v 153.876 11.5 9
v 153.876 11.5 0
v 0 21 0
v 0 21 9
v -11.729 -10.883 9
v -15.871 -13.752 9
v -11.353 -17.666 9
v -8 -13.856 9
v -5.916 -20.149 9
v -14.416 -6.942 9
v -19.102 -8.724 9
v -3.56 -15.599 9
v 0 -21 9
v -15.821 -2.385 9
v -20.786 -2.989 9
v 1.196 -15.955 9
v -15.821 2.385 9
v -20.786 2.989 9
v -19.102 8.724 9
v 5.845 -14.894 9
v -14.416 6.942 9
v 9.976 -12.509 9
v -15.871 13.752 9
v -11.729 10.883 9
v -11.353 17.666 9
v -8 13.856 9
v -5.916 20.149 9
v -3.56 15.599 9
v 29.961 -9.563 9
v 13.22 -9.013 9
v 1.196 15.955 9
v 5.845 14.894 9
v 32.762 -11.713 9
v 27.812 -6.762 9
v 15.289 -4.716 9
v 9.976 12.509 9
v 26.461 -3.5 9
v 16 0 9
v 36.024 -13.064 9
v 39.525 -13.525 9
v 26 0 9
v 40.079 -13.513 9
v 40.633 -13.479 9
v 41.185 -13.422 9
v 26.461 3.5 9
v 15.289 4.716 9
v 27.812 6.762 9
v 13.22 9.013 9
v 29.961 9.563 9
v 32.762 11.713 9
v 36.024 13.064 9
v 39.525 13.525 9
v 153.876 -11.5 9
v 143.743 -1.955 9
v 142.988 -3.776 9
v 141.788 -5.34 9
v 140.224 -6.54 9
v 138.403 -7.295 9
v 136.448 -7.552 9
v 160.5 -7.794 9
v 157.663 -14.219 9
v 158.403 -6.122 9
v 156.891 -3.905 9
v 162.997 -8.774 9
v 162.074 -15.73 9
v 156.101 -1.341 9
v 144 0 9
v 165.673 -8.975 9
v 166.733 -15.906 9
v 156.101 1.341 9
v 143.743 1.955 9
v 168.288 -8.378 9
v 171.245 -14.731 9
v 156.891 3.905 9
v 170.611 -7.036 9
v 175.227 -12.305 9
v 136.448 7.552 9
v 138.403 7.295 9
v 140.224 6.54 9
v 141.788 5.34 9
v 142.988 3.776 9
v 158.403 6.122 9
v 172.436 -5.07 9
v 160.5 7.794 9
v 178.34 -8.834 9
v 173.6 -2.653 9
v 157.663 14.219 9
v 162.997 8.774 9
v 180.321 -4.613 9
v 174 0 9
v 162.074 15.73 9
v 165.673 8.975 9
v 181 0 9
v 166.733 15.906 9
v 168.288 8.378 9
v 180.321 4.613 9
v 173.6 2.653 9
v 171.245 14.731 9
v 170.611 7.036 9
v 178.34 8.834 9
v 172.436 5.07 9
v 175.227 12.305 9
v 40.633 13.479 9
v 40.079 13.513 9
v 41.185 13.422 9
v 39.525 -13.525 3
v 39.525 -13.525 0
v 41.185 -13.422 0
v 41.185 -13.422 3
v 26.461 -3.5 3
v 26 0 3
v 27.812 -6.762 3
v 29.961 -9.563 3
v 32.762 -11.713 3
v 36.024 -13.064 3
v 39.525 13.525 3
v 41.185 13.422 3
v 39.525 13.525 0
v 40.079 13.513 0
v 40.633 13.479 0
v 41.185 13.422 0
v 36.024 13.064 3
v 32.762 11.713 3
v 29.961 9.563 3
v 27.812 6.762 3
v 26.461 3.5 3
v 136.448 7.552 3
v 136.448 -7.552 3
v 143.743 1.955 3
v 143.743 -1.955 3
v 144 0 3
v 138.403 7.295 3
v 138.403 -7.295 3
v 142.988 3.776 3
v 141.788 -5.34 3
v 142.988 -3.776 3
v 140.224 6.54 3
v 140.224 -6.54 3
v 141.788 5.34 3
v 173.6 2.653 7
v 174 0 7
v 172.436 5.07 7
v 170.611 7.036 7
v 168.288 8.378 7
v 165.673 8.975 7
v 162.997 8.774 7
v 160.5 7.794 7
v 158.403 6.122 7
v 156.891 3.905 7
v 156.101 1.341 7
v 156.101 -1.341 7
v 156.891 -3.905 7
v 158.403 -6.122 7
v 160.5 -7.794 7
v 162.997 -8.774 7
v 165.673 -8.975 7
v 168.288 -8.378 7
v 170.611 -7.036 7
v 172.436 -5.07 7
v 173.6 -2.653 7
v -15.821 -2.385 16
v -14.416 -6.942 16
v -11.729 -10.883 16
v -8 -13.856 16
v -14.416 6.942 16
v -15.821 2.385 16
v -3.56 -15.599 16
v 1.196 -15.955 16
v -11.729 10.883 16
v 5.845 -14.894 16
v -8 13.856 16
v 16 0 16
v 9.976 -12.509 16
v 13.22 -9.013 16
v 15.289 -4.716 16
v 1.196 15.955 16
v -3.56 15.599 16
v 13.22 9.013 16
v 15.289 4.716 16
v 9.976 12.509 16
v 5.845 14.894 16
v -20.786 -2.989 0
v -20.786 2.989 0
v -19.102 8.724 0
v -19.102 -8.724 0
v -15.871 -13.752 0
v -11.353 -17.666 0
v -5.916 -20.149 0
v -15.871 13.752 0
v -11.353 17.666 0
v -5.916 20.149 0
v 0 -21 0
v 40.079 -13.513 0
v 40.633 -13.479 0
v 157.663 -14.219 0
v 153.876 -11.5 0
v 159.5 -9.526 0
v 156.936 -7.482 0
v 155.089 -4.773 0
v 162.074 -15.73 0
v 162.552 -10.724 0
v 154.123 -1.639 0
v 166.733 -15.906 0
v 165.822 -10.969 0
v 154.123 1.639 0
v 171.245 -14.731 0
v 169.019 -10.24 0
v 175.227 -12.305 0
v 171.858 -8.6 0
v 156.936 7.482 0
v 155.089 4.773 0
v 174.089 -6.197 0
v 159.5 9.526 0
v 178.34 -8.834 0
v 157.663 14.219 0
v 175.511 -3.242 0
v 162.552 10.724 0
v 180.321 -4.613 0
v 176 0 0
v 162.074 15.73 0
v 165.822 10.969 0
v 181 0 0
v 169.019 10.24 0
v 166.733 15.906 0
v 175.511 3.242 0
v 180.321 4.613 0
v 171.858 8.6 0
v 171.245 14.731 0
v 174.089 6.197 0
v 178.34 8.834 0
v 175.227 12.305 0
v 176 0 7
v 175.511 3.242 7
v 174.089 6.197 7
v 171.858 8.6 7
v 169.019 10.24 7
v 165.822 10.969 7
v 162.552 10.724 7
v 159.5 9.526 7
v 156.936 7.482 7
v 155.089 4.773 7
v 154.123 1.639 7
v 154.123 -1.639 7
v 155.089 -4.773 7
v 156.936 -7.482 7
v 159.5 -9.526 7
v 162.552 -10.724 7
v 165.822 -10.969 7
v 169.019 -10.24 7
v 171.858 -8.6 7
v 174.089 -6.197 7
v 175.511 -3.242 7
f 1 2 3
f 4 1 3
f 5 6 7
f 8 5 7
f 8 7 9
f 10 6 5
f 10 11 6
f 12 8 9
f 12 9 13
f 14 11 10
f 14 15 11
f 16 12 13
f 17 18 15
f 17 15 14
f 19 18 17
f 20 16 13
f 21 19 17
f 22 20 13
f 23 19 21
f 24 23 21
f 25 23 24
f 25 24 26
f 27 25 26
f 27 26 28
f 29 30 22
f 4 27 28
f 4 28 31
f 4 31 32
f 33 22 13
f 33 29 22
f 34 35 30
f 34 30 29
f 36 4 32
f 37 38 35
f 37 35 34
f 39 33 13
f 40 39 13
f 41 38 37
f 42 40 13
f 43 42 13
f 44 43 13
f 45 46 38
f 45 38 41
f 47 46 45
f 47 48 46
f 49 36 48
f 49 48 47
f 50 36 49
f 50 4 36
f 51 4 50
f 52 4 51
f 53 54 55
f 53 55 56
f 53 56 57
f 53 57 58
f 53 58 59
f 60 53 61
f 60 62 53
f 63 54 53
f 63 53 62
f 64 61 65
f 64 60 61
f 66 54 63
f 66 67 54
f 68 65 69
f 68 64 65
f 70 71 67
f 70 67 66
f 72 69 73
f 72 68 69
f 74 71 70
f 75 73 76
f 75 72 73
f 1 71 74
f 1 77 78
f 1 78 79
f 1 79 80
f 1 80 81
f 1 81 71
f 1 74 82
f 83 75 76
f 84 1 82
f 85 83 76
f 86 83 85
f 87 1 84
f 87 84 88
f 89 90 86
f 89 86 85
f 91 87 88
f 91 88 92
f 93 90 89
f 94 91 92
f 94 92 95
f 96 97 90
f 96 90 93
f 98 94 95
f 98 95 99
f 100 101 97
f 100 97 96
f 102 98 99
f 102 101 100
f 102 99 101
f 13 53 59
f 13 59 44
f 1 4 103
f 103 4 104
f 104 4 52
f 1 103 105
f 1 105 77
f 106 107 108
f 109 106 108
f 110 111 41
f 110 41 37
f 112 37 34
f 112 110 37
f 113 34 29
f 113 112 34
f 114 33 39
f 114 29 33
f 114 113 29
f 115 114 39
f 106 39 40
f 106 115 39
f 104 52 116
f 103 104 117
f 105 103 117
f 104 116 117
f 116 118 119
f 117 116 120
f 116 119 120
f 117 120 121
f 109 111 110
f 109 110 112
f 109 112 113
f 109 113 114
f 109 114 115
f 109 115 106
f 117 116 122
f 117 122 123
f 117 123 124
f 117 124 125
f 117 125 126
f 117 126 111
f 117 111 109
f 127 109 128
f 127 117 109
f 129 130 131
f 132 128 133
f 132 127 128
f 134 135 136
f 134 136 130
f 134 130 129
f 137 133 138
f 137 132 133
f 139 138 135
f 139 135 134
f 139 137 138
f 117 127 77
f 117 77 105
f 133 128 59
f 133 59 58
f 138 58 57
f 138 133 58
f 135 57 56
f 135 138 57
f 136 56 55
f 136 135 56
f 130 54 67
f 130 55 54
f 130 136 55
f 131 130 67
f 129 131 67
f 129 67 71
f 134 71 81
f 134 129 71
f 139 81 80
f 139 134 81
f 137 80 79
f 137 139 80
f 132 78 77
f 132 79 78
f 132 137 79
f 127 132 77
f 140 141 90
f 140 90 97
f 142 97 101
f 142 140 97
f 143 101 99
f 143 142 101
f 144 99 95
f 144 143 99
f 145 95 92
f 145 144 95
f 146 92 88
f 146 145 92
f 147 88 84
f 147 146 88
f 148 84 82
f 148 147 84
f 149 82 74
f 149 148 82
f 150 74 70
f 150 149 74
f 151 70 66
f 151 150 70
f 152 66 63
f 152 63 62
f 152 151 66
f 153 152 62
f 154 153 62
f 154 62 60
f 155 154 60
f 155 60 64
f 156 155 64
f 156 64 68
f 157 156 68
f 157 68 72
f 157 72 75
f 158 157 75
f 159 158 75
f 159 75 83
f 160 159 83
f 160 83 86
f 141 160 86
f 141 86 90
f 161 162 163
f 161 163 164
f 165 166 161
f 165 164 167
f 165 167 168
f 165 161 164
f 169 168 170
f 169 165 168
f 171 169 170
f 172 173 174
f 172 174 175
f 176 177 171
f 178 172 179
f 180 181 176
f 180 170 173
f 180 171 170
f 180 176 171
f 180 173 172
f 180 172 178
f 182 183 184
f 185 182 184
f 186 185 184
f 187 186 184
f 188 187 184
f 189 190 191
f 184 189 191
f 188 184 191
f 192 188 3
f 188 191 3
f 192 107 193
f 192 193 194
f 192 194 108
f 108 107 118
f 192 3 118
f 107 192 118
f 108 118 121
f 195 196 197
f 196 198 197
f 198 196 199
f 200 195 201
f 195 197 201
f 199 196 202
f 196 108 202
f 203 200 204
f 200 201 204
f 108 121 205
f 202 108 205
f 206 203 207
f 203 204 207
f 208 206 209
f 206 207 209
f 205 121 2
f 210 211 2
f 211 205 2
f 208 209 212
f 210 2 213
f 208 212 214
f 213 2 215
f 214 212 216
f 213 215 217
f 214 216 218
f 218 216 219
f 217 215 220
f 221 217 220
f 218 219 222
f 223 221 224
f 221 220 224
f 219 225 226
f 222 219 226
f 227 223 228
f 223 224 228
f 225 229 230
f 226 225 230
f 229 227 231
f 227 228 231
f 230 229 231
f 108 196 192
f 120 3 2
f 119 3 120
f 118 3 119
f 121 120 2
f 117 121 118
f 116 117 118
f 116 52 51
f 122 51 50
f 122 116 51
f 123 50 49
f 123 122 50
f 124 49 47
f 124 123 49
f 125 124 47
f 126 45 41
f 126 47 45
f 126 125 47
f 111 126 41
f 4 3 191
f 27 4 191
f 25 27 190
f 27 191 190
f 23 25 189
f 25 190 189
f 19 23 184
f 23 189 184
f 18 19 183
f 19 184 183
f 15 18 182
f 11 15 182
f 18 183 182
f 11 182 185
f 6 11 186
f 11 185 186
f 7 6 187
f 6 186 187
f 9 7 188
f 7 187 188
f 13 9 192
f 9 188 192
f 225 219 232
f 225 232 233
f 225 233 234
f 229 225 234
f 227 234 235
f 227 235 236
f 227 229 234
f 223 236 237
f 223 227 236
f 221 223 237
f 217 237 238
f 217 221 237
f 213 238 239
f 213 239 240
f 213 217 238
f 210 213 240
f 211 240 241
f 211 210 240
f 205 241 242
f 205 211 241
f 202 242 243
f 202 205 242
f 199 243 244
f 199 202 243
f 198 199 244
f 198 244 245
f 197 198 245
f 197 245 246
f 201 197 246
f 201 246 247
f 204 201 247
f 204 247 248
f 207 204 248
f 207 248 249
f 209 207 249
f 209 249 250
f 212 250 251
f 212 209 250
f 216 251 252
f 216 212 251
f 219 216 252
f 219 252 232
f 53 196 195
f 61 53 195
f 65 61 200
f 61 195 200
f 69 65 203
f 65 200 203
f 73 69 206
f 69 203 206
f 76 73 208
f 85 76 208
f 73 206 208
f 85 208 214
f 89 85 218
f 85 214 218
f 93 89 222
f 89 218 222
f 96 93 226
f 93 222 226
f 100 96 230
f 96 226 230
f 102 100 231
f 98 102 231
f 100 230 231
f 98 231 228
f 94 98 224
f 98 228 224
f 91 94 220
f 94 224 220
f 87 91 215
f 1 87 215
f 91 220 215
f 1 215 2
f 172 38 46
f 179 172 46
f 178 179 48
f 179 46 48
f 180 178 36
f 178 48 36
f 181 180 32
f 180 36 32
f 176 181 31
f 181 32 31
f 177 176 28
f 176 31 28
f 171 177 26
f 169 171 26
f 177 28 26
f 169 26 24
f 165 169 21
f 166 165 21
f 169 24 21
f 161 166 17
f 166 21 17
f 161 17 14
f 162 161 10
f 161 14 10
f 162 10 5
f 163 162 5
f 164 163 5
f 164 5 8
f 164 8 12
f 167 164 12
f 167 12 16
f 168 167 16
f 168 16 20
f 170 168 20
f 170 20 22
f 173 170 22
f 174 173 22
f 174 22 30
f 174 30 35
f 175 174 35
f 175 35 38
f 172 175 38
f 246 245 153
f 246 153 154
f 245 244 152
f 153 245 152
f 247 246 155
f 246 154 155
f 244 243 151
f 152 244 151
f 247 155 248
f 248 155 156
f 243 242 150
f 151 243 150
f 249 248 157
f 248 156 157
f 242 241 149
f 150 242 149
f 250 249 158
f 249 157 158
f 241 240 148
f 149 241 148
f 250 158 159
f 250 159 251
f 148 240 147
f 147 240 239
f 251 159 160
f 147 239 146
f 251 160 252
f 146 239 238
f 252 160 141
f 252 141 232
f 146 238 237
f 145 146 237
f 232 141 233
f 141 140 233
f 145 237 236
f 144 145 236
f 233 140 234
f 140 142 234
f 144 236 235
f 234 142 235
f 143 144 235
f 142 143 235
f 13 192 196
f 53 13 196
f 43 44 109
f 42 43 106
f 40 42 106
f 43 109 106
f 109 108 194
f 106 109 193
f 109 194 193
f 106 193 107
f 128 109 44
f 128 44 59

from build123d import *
from build123d.topology import SkipClean

# Parameters (mm, degrees)
SKETCH6_R           = 9
BOSS_EXTRUDE2_DEPTH = 9
SKETCH6_10_R        = 16
BOSS_EXTRUDE3_DEPTH = 16
CUT_EXTRUDE2_REACH  = 187.915
CUT_EXTRUDE2_START  = 3
SKETCH6_20_R        = 11
CUT_EXTRUDE5_DEPTH  = 7


with BuildPart() as part:
    # Sketch6 → Boss-Extrude2 (new body)
    with BuildSketch(Plane.XY):
        with BuildLine():
            Line((0, -21), (153.875702269, -11.5))
            ThreePointArc((153.875702269, -11.5), (181, 0), (153.875702269, 11.5))
            Line((153.875702269, 11.5), (0, 21))
            ThreePointArc((0, 21), (-21, 0), (0, -21))
        make_face()
        with Locations((165, 0)):
            Circle(SKETCH6_R, mode=Mode.SUBTRACT)
        with BuildLine():
            ThreePointArc((41.185040199, -13.422236438), (40.356373264, -13.49895246), (39.524556783, -13.524556783))
            Line((39.524556783, -13.524556783), (41.185040199, -13.422236438))
        make_face(mode=Mode.SUBTRACT)
        with BuildLine():
            ThreePointArc((39.524556783, 13.524556783), (40.356373264, 13.49895246), (41.185040199, 13.422236438))
            Line((41.185040199, 13.422236438), (39.524556783, 13.524556783))
        make_face(mode=Mode.SUBTRACT)
    extrude(amount=BOSS_EXTRUDE2_DEPTH)

    # Sketch6<10> → Boss-Extrude3 (add)
    with BuildSketch(Plane.XY):
        Circle(SKETCH6_10_R)
    extrude(amount=BOSS_EXTRUDE3_DEPTH)

    # Sketch6<13> → Cut-Extrude2 (cut, up to next)
    with BuildSketch(Plane.XY.offset(CUT_EXTRUDE2_START), mode=Mode.PRIVATE) as cut_extrude2_sk1:
        with BuildLine():
            ThreePointArc((39.524556783, 13.524556783), (29.961250969, 9.563305814), (26, 0))
            Line((26, 0), (144, 0))
            ThreePointArc((144, 0), (141.788053239, 5.34011187), (136.447941368, 7.552058632))
            Line((136.447941368, 7.552058632), (41.185040199, 13.422236438))
            Line((41.185040199, 13.422236438), (39.524556783, 13.524556783))
        make_face()
    cut_extrude2_tool1 = extrude(cut_extrude2_sk1.sketch, amount=CUT_EXTRUDE2_REACH, mode=Mode.PRIVATE) & part.part
    # Sketch6<13> → Cut-Extrude2 (cut, up to next)
    with BuildSketch(Plane.XY.offset(CUT_EXTRUDE2_START), mode=Mode.PRIVATE) as cut_extrude2_sk2:
        with BuildLine():
            Line((144, 0), (26, 0))
            ThreePointArc((26, 0), (29.961250969, -9.563305814), (39.524556783, -13.524556783))
            Line((39.524556783, -13.524556783), (41.185040199, -13.422236438))
            Line((41.185040199, -13.422236438), (136.447941368, -7.552058632))
            ThreePointArc((136.447941368, -7.552058632), (141.788053239, -5.34011187), (144, 0))
        make_face()
    cut_extrude2_tool2 = extrude(cut_extrude2_sk2.sketch, amount=CUT_EXTRUDE2_REACH, mode=Mode.PRIVATE) & part.part
    add(cut_extrude2_tool1.solids().sort_by_distance((79.598695, 5.367714, 3))[0], mode=Mode.SUBTRACT)
    add(cut_extrude2_tool2.solids().sort_by_distance((79.598695, -5.367714, 3))[0], mode=Mode.SUBTRACT)

    # Sketch6<20> → Cut-Extrude5 (cut)
    with SkipClean():  # the faces are left unmerged after this step: merging them gives an invalid solid
        with BuildSketch(Plane.XY):
            with Locations((165, 0)):
                Circle(SKETCH6_20_R)
        extrude(amount=CUT_EXTRUDE5_DEPTH, mode=Mode.SUBTRACT)


solid = part.part
